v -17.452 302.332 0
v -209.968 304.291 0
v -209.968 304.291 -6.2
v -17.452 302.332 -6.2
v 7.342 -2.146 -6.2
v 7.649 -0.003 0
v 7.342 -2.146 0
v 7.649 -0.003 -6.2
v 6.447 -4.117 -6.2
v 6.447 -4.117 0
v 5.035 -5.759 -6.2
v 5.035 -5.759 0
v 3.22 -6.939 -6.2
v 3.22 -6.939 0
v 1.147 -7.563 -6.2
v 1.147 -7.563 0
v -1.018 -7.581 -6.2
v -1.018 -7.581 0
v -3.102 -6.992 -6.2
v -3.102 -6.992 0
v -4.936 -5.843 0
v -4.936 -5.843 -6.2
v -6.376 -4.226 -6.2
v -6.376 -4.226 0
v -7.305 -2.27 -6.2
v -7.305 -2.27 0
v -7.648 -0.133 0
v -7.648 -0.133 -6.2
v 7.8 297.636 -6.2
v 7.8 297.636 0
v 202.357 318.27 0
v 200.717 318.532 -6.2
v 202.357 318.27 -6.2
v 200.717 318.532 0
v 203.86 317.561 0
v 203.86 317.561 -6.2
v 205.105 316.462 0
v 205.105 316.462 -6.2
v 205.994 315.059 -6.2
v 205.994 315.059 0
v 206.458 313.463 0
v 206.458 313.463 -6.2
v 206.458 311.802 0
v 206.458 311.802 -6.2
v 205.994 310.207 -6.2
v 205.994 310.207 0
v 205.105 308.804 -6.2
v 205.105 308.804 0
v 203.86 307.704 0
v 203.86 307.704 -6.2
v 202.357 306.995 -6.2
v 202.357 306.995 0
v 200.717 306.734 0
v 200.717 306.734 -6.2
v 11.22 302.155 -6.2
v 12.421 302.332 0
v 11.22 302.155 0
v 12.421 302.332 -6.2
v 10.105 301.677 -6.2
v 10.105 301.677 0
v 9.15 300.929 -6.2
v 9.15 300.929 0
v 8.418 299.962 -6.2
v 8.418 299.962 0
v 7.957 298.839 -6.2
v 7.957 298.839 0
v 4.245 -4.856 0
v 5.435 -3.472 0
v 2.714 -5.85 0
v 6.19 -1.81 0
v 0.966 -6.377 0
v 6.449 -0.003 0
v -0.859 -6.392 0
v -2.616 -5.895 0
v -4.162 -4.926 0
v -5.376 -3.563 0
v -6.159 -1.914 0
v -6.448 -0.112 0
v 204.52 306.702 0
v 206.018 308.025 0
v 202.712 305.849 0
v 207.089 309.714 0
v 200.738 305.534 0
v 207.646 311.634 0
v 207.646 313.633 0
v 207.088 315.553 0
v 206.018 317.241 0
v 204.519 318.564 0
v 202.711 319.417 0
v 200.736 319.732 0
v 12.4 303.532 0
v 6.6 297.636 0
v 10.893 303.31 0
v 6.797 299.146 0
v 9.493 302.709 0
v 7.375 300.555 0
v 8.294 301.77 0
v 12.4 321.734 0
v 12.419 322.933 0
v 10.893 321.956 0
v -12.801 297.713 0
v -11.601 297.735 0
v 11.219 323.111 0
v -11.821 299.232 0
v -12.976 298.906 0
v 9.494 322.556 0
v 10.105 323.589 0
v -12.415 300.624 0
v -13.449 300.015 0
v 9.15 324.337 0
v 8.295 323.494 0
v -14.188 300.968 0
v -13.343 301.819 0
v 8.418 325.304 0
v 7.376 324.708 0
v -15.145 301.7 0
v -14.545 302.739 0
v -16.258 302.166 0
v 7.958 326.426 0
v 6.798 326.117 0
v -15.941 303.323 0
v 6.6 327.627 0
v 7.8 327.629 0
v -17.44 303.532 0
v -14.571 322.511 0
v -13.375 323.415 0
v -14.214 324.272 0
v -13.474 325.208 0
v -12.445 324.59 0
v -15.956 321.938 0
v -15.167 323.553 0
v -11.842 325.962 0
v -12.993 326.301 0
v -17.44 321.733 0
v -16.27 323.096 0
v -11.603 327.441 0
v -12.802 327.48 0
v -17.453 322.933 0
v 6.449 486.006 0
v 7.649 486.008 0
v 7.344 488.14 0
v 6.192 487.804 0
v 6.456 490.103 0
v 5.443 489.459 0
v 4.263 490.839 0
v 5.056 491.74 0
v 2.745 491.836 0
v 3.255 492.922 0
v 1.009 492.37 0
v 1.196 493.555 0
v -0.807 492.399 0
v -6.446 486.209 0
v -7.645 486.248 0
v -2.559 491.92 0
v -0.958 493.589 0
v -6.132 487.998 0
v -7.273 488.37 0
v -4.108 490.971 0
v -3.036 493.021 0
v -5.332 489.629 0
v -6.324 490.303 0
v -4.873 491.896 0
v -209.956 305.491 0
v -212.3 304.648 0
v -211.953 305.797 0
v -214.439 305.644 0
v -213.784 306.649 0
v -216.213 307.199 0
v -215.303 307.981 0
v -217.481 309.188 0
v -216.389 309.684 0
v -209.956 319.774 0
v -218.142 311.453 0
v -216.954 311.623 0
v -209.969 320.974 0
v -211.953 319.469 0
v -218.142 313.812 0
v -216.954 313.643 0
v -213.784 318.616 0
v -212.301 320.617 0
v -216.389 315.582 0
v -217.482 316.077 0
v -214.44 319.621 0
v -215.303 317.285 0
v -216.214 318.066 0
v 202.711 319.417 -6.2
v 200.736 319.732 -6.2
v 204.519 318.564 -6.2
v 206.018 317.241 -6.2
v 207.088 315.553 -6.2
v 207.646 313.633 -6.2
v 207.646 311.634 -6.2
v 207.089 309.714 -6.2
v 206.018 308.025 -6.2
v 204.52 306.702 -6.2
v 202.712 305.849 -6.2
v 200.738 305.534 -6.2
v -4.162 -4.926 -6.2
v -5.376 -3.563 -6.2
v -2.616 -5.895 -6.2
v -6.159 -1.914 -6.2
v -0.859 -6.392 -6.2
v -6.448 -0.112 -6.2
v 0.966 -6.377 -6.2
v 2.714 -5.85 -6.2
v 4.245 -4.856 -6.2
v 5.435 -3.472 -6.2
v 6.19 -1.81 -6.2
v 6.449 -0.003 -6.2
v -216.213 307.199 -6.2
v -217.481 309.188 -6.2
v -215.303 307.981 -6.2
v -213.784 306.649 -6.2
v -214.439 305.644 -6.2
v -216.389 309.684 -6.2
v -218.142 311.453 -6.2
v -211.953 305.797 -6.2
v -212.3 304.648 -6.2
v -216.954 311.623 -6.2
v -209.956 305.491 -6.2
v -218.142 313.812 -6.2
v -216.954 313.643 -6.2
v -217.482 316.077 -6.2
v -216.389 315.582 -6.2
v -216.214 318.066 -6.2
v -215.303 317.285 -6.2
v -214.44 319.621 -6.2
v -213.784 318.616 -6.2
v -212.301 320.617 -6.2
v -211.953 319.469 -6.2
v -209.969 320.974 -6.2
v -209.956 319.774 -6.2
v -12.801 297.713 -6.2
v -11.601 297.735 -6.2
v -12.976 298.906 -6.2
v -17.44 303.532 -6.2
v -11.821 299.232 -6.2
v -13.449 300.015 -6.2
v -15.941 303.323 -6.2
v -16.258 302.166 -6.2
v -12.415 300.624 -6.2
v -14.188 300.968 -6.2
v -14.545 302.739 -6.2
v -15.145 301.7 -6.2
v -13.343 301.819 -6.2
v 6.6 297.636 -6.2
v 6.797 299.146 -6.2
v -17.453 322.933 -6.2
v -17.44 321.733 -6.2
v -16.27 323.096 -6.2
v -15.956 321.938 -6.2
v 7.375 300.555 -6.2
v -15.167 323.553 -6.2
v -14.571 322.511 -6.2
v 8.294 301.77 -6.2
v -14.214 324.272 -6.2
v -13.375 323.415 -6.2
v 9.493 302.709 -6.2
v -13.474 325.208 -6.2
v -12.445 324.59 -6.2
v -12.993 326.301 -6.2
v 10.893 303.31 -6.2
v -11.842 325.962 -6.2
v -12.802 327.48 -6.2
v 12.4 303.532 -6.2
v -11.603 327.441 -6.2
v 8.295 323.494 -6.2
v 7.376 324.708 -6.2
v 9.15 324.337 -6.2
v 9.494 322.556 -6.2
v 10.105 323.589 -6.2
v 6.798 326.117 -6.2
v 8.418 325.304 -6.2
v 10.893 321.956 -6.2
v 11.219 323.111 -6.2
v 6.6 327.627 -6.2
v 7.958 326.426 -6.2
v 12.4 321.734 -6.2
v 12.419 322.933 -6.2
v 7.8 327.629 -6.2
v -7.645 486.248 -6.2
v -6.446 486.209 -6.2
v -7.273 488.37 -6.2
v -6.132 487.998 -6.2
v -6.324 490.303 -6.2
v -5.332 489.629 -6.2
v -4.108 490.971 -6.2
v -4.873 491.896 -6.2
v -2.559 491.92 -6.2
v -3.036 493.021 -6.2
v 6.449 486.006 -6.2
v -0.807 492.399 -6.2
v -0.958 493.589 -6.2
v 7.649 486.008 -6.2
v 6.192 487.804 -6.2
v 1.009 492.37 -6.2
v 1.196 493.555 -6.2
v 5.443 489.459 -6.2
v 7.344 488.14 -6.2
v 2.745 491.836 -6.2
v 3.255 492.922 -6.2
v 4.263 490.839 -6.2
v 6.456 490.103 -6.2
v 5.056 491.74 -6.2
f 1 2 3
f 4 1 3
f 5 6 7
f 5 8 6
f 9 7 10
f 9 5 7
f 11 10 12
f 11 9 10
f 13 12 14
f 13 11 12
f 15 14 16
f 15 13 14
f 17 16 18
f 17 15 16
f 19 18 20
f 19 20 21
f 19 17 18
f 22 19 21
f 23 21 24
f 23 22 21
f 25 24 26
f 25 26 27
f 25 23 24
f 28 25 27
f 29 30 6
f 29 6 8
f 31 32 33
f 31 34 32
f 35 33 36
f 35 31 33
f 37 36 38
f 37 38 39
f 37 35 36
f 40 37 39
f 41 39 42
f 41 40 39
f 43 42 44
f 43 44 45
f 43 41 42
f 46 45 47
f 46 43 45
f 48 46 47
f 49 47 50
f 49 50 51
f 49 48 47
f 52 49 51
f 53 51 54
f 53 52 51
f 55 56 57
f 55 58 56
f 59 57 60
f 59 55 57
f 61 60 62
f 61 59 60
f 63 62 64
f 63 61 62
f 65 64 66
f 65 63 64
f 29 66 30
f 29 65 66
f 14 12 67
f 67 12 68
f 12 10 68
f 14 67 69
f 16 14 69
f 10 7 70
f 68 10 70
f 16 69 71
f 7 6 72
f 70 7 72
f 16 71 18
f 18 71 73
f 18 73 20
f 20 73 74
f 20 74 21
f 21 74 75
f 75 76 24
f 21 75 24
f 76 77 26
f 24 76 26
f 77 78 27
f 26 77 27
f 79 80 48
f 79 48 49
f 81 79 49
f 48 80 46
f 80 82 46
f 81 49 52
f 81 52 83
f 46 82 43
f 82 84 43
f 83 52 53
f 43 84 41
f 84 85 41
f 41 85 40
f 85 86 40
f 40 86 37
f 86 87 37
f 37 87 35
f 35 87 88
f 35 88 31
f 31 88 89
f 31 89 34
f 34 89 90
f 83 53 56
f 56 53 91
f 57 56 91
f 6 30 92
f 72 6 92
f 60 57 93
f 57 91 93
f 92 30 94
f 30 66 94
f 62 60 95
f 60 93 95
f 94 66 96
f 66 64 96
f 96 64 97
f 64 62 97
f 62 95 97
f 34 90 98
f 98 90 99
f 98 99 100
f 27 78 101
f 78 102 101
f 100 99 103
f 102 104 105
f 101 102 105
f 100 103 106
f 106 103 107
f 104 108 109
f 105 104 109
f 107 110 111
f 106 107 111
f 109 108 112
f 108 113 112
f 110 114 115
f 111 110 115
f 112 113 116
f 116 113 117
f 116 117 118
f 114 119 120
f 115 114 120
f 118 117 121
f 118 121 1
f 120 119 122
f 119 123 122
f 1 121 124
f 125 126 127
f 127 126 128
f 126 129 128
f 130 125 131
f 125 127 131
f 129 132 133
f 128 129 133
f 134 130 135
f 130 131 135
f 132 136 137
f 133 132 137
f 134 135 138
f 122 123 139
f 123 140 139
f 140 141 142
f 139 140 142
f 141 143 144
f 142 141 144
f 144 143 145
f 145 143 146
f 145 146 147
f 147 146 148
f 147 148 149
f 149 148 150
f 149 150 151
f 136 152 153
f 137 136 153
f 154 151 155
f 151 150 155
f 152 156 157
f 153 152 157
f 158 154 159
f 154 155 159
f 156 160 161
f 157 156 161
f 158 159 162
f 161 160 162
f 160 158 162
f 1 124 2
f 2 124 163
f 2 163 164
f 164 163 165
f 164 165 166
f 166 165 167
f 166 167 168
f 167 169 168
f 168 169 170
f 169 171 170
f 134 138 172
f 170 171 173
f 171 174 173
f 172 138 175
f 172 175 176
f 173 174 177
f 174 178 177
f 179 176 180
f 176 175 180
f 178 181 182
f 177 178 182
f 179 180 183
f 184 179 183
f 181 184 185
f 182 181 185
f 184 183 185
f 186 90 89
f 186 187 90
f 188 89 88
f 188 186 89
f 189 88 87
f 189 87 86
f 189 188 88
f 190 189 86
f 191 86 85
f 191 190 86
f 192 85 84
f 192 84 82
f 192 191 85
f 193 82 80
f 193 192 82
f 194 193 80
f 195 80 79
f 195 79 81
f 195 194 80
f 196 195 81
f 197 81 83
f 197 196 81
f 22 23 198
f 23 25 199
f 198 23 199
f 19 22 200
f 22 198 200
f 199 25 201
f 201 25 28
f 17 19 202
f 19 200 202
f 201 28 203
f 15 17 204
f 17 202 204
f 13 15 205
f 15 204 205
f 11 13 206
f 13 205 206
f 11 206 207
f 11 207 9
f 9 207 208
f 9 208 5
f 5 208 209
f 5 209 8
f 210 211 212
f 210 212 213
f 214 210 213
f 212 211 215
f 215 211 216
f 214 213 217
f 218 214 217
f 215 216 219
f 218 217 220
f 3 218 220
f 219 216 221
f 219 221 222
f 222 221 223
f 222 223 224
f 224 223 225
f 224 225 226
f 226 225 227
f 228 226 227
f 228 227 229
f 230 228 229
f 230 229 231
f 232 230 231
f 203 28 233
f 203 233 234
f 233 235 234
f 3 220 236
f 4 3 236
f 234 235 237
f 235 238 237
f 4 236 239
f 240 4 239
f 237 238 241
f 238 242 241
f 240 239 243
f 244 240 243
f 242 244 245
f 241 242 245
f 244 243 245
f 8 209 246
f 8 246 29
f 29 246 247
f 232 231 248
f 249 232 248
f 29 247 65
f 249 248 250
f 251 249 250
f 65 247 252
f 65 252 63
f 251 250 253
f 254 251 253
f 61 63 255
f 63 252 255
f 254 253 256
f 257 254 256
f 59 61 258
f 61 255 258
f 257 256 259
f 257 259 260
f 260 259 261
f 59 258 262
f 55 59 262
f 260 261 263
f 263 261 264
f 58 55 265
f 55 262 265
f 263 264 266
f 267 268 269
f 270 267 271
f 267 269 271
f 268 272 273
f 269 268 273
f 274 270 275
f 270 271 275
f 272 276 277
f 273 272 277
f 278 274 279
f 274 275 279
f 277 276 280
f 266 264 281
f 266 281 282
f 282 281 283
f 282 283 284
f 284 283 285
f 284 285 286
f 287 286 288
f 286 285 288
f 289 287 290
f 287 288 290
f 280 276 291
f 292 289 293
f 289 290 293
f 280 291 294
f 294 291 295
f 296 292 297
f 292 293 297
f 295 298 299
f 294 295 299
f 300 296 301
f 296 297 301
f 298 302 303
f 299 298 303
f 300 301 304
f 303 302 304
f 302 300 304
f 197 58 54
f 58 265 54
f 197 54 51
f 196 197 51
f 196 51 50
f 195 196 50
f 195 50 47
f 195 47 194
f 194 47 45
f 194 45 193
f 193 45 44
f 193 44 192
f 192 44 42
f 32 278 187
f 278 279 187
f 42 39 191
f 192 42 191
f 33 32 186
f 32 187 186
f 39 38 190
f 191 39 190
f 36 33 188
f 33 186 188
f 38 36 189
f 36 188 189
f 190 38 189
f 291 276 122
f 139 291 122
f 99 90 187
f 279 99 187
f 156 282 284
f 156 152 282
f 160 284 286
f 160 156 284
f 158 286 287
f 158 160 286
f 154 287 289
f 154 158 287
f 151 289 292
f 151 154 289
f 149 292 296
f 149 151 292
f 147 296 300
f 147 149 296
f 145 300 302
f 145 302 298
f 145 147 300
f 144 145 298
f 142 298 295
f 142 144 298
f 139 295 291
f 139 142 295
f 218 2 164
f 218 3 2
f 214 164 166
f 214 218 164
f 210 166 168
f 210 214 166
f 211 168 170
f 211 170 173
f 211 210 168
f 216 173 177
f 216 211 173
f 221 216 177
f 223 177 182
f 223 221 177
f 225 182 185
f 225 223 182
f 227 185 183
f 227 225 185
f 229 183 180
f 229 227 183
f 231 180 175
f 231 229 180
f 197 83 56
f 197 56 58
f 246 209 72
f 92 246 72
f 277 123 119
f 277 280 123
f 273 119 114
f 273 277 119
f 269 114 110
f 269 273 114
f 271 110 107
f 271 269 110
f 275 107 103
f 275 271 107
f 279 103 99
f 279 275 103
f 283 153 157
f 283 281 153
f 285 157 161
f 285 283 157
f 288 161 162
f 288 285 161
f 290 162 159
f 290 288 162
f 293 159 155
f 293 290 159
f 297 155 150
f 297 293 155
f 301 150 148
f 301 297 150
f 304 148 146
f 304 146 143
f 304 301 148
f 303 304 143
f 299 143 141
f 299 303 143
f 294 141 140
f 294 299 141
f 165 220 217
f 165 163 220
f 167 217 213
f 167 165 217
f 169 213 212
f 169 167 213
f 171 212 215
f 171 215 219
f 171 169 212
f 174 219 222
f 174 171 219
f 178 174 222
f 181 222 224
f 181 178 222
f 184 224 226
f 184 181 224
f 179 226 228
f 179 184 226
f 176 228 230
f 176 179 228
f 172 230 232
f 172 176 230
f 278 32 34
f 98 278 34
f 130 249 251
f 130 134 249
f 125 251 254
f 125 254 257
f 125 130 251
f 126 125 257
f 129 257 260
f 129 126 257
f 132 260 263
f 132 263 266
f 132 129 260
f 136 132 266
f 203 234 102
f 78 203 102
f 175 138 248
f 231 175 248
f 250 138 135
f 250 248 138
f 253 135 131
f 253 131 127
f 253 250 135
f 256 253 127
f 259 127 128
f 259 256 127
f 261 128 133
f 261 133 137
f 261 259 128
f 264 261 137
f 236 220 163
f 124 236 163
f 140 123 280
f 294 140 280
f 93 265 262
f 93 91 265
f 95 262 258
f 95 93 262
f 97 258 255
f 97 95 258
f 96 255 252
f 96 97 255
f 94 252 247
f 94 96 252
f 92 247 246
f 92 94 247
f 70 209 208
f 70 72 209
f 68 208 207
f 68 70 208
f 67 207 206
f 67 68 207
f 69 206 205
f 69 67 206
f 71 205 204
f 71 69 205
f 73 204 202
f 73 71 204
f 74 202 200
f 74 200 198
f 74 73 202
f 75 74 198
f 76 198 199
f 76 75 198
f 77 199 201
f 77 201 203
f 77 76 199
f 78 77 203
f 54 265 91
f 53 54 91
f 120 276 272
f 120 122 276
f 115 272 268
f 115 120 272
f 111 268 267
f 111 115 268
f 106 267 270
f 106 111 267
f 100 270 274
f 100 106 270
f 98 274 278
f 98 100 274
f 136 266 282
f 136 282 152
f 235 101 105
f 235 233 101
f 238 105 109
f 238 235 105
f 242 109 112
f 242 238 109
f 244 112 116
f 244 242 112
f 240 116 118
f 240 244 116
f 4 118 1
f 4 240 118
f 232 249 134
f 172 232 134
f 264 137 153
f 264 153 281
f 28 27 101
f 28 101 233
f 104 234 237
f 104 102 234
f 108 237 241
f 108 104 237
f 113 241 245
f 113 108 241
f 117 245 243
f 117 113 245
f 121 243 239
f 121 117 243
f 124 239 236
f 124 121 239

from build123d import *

# Parameters (mm, degrees)
SKETCH3_W = 1.2
SKETCH3_H = 6.2


with BuildPart() as part:
    # Sweep1: sweep along a path in Sketch2
    with BuildLine(Plane.XY) as sweep1_path:
        Line((-6.448403422, -0.111551706), (-11.600882618, 297.734761881))
        ThreePointArc((-11.600882618, 297.734761881), (-13.342957561, 301.819476981), (-17.439980035, 303.532407044))
        Line((-17.439980035, 303.532407044), (-209.956343171, 305.490953375))
        ThreePointArc((-209.956343171, 305.490953375), (-217.025815722, 312.63271234), (-209.956343171, 319.774471304))
        Line((-209.956343171, 319.774471304), (-17.439980035, 321.733017635))
        ThreePointArc((-17.439980035, 321.733017635), (-13.374840603, 323.414530272), (-11.603110065, 327.441168355))
        Line((-11.603110065, 327.441168355), (-6.445968569, 486.209379269))
        ThreePointArc((-6.445968569, 486.209379269), (0.101636768, 492.448567317), (6.449365306, 486.006134116))
        Line((6.449365306, 486.006134116), (6.600002669, 327.627100738))
        ThreePointArc((6.600002669, 327.627100738), (8.294727162, 323.494393797), (12.399704541, 321.733564874))
        Line((12.399704541, 321.733564874), (200.716608272, 318.531859805))
        ThreePointArc((200.716608272, 318.531859805), (206.516312813, 312.63271234), (200.716608272, 306.733564874))
        Line((200.716608272, 306.733564874), (12.399704541, 303.531859805))
        ThreePointArc((12.399704541, 303.531859805), (8.293806439, 301.770095054), (6.600000756, 297.635698295))
        Line((6.600000756, 297.635698295), (6.449367397, -0.003263988))
        ThreePointArc((6.449367397, -0.003263988), (0.054146005, -6.449140926), (-6.448403422, -0.111551706))
    # Sketch3 → Sweep1 (sweep)
    with BuildSketch(Plane(origin=(0, 0, 0), x_dir=(1, 0, 0), z_dir=(0, 1, 0))):
        with Locations((7.049367397, 3.1)):
            Rectangle(SKETCH3_W, SKETCH3_H)
    sweep(path=sweep1_path.line)


solid = part.part
